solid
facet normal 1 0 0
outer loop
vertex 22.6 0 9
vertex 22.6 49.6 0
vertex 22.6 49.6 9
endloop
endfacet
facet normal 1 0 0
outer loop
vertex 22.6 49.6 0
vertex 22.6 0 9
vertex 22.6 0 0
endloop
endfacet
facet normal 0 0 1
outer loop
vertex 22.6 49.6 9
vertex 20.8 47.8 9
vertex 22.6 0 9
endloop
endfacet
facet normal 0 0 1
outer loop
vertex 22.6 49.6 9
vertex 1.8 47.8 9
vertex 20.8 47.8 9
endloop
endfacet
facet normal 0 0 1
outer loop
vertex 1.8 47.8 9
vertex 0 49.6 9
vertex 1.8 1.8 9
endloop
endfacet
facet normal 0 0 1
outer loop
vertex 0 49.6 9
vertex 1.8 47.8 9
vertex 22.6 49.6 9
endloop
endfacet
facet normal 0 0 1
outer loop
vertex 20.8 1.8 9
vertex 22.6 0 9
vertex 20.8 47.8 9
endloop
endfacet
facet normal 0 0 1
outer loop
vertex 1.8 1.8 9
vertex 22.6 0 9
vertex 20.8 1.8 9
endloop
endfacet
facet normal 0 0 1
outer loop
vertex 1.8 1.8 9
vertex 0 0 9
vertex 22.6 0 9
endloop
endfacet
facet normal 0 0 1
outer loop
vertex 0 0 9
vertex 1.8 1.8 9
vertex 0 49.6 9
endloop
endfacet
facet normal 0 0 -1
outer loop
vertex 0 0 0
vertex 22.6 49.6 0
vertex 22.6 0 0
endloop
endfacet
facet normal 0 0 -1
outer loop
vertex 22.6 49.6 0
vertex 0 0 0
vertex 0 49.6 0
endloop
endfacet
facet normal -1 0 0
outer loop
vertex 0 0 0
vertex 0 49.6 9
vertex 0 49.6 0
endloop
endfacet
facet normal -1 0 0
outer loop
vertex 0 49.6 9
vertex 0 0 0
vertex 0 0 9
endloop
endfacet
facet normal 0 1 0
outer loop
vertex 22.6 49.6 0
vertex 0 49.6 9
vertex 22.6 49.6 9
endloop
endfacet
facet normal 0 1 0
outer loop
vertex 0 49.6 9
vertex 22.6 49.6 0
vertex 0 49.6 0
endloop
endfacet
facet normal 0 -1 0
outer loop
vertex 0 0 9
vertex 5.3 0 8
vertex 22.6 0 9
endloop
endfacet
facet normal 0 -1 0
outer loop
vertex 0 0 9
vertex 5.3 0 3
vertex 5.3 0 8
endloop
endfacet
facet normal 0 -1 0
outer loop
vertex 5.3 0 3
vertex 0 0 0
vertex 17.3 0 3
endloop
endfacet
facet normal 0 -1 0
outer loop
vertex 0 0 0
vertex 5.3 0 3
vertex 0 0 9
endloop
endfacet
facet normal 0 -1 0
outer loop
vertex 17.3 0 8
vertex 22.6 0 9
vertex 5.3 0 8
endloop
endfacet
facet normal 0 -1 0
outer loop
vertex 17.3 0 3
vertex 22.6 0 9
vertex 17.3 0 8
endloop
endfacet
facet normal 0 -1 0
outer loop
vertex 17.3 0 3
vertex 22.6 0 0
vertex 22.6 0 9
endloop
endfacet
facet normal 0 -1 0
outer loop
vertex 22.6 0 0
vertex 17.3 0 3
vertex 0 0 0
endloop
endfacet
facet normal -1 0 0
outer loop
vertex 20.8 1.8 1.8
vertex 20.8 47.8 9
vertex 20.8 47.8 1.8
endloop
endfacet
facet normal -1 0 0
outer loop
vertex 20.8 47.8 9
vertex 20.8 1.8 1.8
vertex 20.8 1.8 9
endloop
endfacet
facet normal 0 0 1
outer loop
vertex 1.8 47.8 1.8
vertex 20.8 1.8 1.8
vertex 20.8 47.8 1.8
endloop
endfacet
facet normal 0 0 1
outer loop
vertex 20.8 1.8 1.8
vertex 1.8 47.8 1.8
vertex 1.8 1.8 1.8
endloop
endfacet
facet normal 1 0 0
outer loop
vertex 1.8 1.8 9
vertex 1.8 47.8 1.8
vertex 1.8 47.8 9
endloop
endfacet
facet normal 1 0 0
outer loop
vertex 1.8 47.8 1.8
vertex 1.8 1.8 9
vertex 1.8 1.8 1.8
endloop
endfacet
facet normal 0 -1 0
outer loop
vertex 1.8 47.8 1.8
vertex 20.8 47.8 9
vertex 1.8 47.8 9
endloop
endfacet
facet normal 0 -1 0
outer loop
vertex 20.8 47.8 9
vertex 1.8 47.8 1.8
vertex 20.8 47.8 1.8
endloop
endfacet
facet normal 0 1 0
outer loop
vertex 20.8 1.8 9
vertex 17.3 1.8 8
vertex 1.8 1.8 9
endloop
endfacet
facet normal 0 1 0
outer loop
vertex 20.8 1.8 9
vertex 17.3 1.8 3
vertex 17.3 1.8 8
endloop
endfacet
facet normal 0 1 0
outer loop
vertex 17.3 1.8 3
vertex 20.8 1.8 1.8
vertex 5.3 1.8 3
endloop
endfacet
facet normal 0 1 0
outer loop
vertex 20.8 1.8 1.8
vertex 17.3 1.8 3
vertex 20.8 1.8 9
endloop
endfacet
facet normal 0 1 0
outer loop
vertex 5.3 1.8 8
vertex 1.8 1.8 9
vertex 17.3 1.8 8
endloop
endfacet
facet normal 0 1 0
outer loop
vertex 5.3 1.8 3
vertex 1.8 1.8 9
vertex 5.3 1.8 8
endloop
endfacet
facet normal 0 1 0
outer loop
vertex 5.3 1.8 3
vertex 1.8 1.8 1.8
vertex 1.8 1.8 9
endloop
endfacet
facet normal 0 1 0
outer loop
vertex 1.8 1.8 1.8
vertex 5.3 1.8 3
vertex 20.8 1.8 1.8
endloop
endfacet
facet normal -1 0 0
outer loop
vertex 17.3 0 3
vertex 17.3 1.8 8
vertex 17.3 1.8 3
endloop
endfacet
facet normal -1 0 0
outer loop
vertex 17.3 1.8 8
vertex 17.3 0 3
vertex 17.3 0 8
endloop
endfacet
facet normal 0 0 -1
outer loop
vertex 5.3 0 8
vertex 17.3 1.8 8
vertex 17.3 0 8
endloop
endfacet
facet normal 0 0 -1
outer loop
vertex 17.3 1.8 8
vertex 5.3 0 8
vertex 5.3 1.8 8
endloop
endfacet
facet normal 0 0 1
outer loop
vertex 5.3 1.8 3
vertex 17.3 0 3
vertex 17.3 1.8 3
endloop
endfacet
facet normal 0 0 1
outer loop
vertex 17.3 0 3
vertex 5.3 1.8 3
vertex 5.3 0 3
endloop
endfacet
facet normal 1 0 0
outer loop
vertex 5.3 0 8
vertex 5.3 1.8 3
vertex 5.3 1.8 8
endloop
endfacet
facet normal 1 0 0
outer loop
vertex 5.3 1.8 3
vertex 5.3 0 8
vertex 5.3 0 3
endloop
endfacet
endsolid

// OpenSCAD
// iNNOVULIS iStick CONCEPT enclosure for 18 x 45 mm PCB; NOT a fit check.
// No validated shell, ESD qualification, shock certification, or USB fit.
$fn=48;
board_w=18;
board_l=45;
board_h=1.6;
clearance=0.5;
wall=1.8;
inner_w=board_w + 2*clearance;
inner_l=board_l + 2*clearance;
outer_w=inner_w + wall*2;
outer_l=inner_l + wall*2;
outer_h=9;

// One prototype base, not a sealed assembled enclosure.
difference() {
  cube([outer_w,outer_l,outer_h]);
  translate([wall,wall,wall]) cube([inner_w,inner_l,outer_h]);
  // Generic side aperture placeholder. USB-C exact mechanical fit pending.
  translate([outer_w/2-6,-0.3,3]) cube([12,wall+1,5]);
}
